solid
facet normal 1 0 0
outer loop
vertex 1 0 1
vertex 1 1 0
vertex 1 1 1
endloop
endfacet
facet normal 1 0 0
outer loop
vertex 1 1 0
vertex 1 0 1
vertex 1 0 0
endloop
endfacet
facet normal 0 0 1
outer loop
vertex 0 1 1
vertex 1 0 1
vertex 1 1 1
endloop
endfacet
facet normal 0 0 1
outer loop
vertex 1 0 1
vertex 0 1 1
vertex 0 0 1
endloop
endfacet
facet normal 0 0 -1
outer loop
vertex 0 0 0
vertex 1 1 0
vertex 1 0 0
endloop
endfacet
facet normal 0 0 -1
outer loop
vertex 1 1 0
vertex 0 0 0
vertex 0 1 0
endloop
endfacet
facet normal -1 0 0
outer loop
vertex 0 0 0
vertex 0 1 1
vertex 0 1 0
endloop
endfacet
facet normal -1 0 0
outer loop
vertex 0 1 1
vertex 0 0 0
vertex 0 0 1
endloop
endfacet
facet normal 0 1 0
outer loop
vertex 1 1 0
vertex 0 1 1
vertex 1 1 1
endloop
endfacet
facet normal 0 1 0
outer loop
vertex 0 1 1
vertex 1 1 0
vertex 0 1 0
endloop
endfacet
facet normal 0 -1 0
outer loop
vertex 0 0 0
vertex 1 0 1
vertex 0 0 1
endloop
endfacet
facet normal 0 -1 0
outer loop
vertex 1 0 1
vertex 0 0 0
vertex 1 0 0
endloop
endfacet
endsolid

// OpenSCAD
echo("aliceblue"); color("aliceblue") cube();
echo("antiquewhite"); color("antiquewhite") cube();
echo("aqua"); color("aqua") cube();
echo("aquamarine"); color("aquamarine") cube();
echo("azure"); color("azure") cube();
echo("beige"); color("beige") cube();
echo("bisque"); color("bisque") cube();
echo("black"); color("black") cube();
echo("blanchedalmond"); color("blanchedalmond") cube();
echo("blue"); color("blue") cube();
echo("blueviolet"); color("blueviolet") cube();
echo("brown"); color("brown") cube();
echo("burlywood"); color("burlywood") cube();
echo("cadetblue"); color("cadetblue") cube();
echo("chartreuse"); color("chartreuse") cube();
echo("chocolate"); color("chocolate") cube();
echo("coral"); color("coral") cube();
echo("cornflowerblue"); color("cornflowerblue") cube();
echo("cornsilk"); color("cornsilk") cube();
echo("crimson"); color("crimson") cube();
echo("cyan"); color("cyan") cube();
echo("darkblue"); color("darkblue") cube();
echo("darkcyan"); color("darkcyan") cube();
echo("darkgoldenrod"); color("darkgoldenrod") cube();
echo("darkgray"); color("darkgray") cube();
echo("darkgreen"); color("darkgreen") cube();
echo("darkgrey"); color("darkgrey") cube();
echo("darkkhaki"); color("darkkhaki") cube();
echo("darkmagenta"); color("darkmagenta") cube();
echo("darkolivegreen"); color("darkolivegreen") cube();
echo("darkorange"); color("darkorange") cube();
echo("darkorchid"); color("darkorchid") cube();
echo("darkred"); color("darkred") cube();
echo("darksalmon"); color("darksalmon") cube();
echo("darkseagreen"); color("darkseagreen") cube();
echo("darkslateblue"); color("darkslateblue") cube();
echo("darkslategray"); color("darkslategray") cube();
echo("darkslategrey"); color("darkslategrey") cube();
echo("darkturquoise"); color("darkturquoise") cube();
echo("darkviolet"); color("darkviolet") cube();
echo("deeppink"); color("deeppink") cube();
echo("deepskyblue"); color("deepskyblue") cube();
echo("dimgray"); color("dimgray") cube();
echo("dimgrey"); color("dimgrey") cube();
echo("dodgerblue"); color("dodgerblue") cube();
echo("firebrick"); color("firebrick") cube();
echo("floralwhite"); color("floralwhite") cube();
echo("forestgreen"); color("forestgreen") cube();
echo("fuchsia"); color("fuchsia") cube();
echo("gainsboro"); color("gainsboro") cube();
echo("ghostwhite"); color("ghostwhite") cube();
echo("gold"); color("gold") cube();
echo("goldenrod"); color("goldenrod") cube();
echo("gray"); color("gray") cube();
echo("green"); color("green") cube();
echo("greenyellow"); color("greenyellow") cube();
echo("grey"); color("grey") cube();
echo("honeydew"); color("honeydew") cube();
echo("hotpink"); color("hotpink") cube();
echo("indianred"); color("indianred") cube();
echo("indigo"); color("indigo") cube();
echo("ivory"); color("ivory") cube();
echo("khaki"); color("khaki") cube();
echo("lavender"); color("lavender") cube();
echo("lavenderblush"); color("lavenderblush") cube();
echo("lawngreen"); color("lawngreen") cube();
echo("lemonchiffon"); color("lemonchiffon") cube();
echo("lightblue"); color("lightblue") cube();
echo("lightcoral"); color("lightcoral") cube();
echo("lightcyan"); color("lightcyan") cube();
echo("lightgoldenrodyellow"); color("lightgoldenrodyellow") cube();
echo("lightgray"); color("lightgray") cube();
echo("lightgreen"); color("lightgreen") cube();
echo("lightgrey"); color("lightgrey") cube();
echo("lightpink"); color("lightpink") cube();
echo("lightsalmon"); color("lightsalmon") cube();
echo("lightseagreen"); color("lightseagreen") cube();
echo("lightskyblue"); color("lightskyblue") cube();
echo("lightslategray"); color("lightslategray") cube();
echo("lightslategrey"); color("lightslategrey") cube();
echo("lightsteelblue"); color("lightsteelblue") cube();
echo("lightyellow"); color("lightyellow") cube();
echo("lime"); color("lime") cube();
echo("limegreen"); color("limegreen") cube();
echo("linen"); color("linen") cube();
echo("magenta"); color("magenta") cube();
echo("maroon"); color("maroon") cube();
echo("mediumaquamarine"); color("mediumaquamarine") cube();
echo("mediumblue"); color("mediumblue") cube();
echo("mediumorchid"); color("mediumorchid") cube();
echo("mediumpurple"); color("mediumpurple") cube();
echo("mediumseagreen"); color("mediumseagreen") cube();
echo("mediumslateblue"); color("mediumslateblue") cube();
echo("mediumspringgreen"); color("mediumspringgreen") cube();
echo("mediumturquoise"); color("mediumturquoise") cube();
echo("mediumvioletred"); color("mediumvioletred") cube();
echo("midnightblue"); color("midnightblue") cube();
echo("mintcream"); color("mintcream") cube();
echo("mistyrose"); color("mistyrose") cube();
echo("moccasin"); color("moccasin") cube();
echo("navajowhite"); color("navajowhite") cube();
echo("navy"); color("navy") cube();
echo("oldlace"); color("oldlace") cube();
echo("olive"); color("olive") cube();
echo("olivedrab"); color("olivedrab") cube();
echo("orange"); color("orange") cube();
echo("orangered"); color("orangered") cube();
echo("orchid"); color("orchid") cube();
echo("palegoldenrod"); color("palegoldenrod") cube();
echo("palegreen"); color("palegreen") cube();
echo("paleturquoise"); color("paleturquoise") cube();
echo("palevioletred"); color("palevioletred") cube();
echo("papayawhip"); color("papayawhip") cube();
echo("peachpuff"); color("peachpuff") cube();
echo("peru"); color("peru") cube();
echo("pink"); color("pink") cube();
echo("plum"); color("plum") cube();
echo("powderblue"); color("powderblue") cube();
echo("purple"); color("purple") cube();
echo("rebeccapurple"); color("rebeccapurple") cube();
echo("red"); color("red") cube();
echo("rosybrown"); color("rosybrown") cube();
echo("royalblue"); color("royalblue") cube();
echo("saddlebrown"); color("saddlebrown") cube();
echo("salmon"); color("salmon") cube();
echo("sandybrown"); color("sandybrown") cube();
echo("seagreen"); color("seagreen") cube();
echo("seashell"); color("seashell") cube();
echo("sienna"); color("sienna") cube();
echo("silver"); color("silver") cube();
echo("skyblue"); color("skyblue") cube();
echo("slateblue"); color("slateblue") cube();
echo("slategray"); color("slategray") cube();
echo("slategrey"); color("slategrey") cube();
echo("snow"); color("snow") cube();
echo("springgreen"); color("springgreen") cube();
echo("steelblue"); color("steelblue") cube();
echo("tan"); color("tan") cube();
echo("teal"); color("teal") cube();
echo("thistle"); color("thistle") cube();
echo("tomato"); color("tomato") cube();
echo("transparent"); color("transparent") cube();
echo("turquoise"); color("turquoise") cube();
echo("violet"); color("violet") cube();
echo("wheat"); color("wheat") cube();
echo("white"); color("white") cube();
echo("whitesmoke"); color("whitesmoke") cube();
echo("yellow"); color("yellow") cube();
echo("yellowgreen"); color("yellowgreen") cube();
